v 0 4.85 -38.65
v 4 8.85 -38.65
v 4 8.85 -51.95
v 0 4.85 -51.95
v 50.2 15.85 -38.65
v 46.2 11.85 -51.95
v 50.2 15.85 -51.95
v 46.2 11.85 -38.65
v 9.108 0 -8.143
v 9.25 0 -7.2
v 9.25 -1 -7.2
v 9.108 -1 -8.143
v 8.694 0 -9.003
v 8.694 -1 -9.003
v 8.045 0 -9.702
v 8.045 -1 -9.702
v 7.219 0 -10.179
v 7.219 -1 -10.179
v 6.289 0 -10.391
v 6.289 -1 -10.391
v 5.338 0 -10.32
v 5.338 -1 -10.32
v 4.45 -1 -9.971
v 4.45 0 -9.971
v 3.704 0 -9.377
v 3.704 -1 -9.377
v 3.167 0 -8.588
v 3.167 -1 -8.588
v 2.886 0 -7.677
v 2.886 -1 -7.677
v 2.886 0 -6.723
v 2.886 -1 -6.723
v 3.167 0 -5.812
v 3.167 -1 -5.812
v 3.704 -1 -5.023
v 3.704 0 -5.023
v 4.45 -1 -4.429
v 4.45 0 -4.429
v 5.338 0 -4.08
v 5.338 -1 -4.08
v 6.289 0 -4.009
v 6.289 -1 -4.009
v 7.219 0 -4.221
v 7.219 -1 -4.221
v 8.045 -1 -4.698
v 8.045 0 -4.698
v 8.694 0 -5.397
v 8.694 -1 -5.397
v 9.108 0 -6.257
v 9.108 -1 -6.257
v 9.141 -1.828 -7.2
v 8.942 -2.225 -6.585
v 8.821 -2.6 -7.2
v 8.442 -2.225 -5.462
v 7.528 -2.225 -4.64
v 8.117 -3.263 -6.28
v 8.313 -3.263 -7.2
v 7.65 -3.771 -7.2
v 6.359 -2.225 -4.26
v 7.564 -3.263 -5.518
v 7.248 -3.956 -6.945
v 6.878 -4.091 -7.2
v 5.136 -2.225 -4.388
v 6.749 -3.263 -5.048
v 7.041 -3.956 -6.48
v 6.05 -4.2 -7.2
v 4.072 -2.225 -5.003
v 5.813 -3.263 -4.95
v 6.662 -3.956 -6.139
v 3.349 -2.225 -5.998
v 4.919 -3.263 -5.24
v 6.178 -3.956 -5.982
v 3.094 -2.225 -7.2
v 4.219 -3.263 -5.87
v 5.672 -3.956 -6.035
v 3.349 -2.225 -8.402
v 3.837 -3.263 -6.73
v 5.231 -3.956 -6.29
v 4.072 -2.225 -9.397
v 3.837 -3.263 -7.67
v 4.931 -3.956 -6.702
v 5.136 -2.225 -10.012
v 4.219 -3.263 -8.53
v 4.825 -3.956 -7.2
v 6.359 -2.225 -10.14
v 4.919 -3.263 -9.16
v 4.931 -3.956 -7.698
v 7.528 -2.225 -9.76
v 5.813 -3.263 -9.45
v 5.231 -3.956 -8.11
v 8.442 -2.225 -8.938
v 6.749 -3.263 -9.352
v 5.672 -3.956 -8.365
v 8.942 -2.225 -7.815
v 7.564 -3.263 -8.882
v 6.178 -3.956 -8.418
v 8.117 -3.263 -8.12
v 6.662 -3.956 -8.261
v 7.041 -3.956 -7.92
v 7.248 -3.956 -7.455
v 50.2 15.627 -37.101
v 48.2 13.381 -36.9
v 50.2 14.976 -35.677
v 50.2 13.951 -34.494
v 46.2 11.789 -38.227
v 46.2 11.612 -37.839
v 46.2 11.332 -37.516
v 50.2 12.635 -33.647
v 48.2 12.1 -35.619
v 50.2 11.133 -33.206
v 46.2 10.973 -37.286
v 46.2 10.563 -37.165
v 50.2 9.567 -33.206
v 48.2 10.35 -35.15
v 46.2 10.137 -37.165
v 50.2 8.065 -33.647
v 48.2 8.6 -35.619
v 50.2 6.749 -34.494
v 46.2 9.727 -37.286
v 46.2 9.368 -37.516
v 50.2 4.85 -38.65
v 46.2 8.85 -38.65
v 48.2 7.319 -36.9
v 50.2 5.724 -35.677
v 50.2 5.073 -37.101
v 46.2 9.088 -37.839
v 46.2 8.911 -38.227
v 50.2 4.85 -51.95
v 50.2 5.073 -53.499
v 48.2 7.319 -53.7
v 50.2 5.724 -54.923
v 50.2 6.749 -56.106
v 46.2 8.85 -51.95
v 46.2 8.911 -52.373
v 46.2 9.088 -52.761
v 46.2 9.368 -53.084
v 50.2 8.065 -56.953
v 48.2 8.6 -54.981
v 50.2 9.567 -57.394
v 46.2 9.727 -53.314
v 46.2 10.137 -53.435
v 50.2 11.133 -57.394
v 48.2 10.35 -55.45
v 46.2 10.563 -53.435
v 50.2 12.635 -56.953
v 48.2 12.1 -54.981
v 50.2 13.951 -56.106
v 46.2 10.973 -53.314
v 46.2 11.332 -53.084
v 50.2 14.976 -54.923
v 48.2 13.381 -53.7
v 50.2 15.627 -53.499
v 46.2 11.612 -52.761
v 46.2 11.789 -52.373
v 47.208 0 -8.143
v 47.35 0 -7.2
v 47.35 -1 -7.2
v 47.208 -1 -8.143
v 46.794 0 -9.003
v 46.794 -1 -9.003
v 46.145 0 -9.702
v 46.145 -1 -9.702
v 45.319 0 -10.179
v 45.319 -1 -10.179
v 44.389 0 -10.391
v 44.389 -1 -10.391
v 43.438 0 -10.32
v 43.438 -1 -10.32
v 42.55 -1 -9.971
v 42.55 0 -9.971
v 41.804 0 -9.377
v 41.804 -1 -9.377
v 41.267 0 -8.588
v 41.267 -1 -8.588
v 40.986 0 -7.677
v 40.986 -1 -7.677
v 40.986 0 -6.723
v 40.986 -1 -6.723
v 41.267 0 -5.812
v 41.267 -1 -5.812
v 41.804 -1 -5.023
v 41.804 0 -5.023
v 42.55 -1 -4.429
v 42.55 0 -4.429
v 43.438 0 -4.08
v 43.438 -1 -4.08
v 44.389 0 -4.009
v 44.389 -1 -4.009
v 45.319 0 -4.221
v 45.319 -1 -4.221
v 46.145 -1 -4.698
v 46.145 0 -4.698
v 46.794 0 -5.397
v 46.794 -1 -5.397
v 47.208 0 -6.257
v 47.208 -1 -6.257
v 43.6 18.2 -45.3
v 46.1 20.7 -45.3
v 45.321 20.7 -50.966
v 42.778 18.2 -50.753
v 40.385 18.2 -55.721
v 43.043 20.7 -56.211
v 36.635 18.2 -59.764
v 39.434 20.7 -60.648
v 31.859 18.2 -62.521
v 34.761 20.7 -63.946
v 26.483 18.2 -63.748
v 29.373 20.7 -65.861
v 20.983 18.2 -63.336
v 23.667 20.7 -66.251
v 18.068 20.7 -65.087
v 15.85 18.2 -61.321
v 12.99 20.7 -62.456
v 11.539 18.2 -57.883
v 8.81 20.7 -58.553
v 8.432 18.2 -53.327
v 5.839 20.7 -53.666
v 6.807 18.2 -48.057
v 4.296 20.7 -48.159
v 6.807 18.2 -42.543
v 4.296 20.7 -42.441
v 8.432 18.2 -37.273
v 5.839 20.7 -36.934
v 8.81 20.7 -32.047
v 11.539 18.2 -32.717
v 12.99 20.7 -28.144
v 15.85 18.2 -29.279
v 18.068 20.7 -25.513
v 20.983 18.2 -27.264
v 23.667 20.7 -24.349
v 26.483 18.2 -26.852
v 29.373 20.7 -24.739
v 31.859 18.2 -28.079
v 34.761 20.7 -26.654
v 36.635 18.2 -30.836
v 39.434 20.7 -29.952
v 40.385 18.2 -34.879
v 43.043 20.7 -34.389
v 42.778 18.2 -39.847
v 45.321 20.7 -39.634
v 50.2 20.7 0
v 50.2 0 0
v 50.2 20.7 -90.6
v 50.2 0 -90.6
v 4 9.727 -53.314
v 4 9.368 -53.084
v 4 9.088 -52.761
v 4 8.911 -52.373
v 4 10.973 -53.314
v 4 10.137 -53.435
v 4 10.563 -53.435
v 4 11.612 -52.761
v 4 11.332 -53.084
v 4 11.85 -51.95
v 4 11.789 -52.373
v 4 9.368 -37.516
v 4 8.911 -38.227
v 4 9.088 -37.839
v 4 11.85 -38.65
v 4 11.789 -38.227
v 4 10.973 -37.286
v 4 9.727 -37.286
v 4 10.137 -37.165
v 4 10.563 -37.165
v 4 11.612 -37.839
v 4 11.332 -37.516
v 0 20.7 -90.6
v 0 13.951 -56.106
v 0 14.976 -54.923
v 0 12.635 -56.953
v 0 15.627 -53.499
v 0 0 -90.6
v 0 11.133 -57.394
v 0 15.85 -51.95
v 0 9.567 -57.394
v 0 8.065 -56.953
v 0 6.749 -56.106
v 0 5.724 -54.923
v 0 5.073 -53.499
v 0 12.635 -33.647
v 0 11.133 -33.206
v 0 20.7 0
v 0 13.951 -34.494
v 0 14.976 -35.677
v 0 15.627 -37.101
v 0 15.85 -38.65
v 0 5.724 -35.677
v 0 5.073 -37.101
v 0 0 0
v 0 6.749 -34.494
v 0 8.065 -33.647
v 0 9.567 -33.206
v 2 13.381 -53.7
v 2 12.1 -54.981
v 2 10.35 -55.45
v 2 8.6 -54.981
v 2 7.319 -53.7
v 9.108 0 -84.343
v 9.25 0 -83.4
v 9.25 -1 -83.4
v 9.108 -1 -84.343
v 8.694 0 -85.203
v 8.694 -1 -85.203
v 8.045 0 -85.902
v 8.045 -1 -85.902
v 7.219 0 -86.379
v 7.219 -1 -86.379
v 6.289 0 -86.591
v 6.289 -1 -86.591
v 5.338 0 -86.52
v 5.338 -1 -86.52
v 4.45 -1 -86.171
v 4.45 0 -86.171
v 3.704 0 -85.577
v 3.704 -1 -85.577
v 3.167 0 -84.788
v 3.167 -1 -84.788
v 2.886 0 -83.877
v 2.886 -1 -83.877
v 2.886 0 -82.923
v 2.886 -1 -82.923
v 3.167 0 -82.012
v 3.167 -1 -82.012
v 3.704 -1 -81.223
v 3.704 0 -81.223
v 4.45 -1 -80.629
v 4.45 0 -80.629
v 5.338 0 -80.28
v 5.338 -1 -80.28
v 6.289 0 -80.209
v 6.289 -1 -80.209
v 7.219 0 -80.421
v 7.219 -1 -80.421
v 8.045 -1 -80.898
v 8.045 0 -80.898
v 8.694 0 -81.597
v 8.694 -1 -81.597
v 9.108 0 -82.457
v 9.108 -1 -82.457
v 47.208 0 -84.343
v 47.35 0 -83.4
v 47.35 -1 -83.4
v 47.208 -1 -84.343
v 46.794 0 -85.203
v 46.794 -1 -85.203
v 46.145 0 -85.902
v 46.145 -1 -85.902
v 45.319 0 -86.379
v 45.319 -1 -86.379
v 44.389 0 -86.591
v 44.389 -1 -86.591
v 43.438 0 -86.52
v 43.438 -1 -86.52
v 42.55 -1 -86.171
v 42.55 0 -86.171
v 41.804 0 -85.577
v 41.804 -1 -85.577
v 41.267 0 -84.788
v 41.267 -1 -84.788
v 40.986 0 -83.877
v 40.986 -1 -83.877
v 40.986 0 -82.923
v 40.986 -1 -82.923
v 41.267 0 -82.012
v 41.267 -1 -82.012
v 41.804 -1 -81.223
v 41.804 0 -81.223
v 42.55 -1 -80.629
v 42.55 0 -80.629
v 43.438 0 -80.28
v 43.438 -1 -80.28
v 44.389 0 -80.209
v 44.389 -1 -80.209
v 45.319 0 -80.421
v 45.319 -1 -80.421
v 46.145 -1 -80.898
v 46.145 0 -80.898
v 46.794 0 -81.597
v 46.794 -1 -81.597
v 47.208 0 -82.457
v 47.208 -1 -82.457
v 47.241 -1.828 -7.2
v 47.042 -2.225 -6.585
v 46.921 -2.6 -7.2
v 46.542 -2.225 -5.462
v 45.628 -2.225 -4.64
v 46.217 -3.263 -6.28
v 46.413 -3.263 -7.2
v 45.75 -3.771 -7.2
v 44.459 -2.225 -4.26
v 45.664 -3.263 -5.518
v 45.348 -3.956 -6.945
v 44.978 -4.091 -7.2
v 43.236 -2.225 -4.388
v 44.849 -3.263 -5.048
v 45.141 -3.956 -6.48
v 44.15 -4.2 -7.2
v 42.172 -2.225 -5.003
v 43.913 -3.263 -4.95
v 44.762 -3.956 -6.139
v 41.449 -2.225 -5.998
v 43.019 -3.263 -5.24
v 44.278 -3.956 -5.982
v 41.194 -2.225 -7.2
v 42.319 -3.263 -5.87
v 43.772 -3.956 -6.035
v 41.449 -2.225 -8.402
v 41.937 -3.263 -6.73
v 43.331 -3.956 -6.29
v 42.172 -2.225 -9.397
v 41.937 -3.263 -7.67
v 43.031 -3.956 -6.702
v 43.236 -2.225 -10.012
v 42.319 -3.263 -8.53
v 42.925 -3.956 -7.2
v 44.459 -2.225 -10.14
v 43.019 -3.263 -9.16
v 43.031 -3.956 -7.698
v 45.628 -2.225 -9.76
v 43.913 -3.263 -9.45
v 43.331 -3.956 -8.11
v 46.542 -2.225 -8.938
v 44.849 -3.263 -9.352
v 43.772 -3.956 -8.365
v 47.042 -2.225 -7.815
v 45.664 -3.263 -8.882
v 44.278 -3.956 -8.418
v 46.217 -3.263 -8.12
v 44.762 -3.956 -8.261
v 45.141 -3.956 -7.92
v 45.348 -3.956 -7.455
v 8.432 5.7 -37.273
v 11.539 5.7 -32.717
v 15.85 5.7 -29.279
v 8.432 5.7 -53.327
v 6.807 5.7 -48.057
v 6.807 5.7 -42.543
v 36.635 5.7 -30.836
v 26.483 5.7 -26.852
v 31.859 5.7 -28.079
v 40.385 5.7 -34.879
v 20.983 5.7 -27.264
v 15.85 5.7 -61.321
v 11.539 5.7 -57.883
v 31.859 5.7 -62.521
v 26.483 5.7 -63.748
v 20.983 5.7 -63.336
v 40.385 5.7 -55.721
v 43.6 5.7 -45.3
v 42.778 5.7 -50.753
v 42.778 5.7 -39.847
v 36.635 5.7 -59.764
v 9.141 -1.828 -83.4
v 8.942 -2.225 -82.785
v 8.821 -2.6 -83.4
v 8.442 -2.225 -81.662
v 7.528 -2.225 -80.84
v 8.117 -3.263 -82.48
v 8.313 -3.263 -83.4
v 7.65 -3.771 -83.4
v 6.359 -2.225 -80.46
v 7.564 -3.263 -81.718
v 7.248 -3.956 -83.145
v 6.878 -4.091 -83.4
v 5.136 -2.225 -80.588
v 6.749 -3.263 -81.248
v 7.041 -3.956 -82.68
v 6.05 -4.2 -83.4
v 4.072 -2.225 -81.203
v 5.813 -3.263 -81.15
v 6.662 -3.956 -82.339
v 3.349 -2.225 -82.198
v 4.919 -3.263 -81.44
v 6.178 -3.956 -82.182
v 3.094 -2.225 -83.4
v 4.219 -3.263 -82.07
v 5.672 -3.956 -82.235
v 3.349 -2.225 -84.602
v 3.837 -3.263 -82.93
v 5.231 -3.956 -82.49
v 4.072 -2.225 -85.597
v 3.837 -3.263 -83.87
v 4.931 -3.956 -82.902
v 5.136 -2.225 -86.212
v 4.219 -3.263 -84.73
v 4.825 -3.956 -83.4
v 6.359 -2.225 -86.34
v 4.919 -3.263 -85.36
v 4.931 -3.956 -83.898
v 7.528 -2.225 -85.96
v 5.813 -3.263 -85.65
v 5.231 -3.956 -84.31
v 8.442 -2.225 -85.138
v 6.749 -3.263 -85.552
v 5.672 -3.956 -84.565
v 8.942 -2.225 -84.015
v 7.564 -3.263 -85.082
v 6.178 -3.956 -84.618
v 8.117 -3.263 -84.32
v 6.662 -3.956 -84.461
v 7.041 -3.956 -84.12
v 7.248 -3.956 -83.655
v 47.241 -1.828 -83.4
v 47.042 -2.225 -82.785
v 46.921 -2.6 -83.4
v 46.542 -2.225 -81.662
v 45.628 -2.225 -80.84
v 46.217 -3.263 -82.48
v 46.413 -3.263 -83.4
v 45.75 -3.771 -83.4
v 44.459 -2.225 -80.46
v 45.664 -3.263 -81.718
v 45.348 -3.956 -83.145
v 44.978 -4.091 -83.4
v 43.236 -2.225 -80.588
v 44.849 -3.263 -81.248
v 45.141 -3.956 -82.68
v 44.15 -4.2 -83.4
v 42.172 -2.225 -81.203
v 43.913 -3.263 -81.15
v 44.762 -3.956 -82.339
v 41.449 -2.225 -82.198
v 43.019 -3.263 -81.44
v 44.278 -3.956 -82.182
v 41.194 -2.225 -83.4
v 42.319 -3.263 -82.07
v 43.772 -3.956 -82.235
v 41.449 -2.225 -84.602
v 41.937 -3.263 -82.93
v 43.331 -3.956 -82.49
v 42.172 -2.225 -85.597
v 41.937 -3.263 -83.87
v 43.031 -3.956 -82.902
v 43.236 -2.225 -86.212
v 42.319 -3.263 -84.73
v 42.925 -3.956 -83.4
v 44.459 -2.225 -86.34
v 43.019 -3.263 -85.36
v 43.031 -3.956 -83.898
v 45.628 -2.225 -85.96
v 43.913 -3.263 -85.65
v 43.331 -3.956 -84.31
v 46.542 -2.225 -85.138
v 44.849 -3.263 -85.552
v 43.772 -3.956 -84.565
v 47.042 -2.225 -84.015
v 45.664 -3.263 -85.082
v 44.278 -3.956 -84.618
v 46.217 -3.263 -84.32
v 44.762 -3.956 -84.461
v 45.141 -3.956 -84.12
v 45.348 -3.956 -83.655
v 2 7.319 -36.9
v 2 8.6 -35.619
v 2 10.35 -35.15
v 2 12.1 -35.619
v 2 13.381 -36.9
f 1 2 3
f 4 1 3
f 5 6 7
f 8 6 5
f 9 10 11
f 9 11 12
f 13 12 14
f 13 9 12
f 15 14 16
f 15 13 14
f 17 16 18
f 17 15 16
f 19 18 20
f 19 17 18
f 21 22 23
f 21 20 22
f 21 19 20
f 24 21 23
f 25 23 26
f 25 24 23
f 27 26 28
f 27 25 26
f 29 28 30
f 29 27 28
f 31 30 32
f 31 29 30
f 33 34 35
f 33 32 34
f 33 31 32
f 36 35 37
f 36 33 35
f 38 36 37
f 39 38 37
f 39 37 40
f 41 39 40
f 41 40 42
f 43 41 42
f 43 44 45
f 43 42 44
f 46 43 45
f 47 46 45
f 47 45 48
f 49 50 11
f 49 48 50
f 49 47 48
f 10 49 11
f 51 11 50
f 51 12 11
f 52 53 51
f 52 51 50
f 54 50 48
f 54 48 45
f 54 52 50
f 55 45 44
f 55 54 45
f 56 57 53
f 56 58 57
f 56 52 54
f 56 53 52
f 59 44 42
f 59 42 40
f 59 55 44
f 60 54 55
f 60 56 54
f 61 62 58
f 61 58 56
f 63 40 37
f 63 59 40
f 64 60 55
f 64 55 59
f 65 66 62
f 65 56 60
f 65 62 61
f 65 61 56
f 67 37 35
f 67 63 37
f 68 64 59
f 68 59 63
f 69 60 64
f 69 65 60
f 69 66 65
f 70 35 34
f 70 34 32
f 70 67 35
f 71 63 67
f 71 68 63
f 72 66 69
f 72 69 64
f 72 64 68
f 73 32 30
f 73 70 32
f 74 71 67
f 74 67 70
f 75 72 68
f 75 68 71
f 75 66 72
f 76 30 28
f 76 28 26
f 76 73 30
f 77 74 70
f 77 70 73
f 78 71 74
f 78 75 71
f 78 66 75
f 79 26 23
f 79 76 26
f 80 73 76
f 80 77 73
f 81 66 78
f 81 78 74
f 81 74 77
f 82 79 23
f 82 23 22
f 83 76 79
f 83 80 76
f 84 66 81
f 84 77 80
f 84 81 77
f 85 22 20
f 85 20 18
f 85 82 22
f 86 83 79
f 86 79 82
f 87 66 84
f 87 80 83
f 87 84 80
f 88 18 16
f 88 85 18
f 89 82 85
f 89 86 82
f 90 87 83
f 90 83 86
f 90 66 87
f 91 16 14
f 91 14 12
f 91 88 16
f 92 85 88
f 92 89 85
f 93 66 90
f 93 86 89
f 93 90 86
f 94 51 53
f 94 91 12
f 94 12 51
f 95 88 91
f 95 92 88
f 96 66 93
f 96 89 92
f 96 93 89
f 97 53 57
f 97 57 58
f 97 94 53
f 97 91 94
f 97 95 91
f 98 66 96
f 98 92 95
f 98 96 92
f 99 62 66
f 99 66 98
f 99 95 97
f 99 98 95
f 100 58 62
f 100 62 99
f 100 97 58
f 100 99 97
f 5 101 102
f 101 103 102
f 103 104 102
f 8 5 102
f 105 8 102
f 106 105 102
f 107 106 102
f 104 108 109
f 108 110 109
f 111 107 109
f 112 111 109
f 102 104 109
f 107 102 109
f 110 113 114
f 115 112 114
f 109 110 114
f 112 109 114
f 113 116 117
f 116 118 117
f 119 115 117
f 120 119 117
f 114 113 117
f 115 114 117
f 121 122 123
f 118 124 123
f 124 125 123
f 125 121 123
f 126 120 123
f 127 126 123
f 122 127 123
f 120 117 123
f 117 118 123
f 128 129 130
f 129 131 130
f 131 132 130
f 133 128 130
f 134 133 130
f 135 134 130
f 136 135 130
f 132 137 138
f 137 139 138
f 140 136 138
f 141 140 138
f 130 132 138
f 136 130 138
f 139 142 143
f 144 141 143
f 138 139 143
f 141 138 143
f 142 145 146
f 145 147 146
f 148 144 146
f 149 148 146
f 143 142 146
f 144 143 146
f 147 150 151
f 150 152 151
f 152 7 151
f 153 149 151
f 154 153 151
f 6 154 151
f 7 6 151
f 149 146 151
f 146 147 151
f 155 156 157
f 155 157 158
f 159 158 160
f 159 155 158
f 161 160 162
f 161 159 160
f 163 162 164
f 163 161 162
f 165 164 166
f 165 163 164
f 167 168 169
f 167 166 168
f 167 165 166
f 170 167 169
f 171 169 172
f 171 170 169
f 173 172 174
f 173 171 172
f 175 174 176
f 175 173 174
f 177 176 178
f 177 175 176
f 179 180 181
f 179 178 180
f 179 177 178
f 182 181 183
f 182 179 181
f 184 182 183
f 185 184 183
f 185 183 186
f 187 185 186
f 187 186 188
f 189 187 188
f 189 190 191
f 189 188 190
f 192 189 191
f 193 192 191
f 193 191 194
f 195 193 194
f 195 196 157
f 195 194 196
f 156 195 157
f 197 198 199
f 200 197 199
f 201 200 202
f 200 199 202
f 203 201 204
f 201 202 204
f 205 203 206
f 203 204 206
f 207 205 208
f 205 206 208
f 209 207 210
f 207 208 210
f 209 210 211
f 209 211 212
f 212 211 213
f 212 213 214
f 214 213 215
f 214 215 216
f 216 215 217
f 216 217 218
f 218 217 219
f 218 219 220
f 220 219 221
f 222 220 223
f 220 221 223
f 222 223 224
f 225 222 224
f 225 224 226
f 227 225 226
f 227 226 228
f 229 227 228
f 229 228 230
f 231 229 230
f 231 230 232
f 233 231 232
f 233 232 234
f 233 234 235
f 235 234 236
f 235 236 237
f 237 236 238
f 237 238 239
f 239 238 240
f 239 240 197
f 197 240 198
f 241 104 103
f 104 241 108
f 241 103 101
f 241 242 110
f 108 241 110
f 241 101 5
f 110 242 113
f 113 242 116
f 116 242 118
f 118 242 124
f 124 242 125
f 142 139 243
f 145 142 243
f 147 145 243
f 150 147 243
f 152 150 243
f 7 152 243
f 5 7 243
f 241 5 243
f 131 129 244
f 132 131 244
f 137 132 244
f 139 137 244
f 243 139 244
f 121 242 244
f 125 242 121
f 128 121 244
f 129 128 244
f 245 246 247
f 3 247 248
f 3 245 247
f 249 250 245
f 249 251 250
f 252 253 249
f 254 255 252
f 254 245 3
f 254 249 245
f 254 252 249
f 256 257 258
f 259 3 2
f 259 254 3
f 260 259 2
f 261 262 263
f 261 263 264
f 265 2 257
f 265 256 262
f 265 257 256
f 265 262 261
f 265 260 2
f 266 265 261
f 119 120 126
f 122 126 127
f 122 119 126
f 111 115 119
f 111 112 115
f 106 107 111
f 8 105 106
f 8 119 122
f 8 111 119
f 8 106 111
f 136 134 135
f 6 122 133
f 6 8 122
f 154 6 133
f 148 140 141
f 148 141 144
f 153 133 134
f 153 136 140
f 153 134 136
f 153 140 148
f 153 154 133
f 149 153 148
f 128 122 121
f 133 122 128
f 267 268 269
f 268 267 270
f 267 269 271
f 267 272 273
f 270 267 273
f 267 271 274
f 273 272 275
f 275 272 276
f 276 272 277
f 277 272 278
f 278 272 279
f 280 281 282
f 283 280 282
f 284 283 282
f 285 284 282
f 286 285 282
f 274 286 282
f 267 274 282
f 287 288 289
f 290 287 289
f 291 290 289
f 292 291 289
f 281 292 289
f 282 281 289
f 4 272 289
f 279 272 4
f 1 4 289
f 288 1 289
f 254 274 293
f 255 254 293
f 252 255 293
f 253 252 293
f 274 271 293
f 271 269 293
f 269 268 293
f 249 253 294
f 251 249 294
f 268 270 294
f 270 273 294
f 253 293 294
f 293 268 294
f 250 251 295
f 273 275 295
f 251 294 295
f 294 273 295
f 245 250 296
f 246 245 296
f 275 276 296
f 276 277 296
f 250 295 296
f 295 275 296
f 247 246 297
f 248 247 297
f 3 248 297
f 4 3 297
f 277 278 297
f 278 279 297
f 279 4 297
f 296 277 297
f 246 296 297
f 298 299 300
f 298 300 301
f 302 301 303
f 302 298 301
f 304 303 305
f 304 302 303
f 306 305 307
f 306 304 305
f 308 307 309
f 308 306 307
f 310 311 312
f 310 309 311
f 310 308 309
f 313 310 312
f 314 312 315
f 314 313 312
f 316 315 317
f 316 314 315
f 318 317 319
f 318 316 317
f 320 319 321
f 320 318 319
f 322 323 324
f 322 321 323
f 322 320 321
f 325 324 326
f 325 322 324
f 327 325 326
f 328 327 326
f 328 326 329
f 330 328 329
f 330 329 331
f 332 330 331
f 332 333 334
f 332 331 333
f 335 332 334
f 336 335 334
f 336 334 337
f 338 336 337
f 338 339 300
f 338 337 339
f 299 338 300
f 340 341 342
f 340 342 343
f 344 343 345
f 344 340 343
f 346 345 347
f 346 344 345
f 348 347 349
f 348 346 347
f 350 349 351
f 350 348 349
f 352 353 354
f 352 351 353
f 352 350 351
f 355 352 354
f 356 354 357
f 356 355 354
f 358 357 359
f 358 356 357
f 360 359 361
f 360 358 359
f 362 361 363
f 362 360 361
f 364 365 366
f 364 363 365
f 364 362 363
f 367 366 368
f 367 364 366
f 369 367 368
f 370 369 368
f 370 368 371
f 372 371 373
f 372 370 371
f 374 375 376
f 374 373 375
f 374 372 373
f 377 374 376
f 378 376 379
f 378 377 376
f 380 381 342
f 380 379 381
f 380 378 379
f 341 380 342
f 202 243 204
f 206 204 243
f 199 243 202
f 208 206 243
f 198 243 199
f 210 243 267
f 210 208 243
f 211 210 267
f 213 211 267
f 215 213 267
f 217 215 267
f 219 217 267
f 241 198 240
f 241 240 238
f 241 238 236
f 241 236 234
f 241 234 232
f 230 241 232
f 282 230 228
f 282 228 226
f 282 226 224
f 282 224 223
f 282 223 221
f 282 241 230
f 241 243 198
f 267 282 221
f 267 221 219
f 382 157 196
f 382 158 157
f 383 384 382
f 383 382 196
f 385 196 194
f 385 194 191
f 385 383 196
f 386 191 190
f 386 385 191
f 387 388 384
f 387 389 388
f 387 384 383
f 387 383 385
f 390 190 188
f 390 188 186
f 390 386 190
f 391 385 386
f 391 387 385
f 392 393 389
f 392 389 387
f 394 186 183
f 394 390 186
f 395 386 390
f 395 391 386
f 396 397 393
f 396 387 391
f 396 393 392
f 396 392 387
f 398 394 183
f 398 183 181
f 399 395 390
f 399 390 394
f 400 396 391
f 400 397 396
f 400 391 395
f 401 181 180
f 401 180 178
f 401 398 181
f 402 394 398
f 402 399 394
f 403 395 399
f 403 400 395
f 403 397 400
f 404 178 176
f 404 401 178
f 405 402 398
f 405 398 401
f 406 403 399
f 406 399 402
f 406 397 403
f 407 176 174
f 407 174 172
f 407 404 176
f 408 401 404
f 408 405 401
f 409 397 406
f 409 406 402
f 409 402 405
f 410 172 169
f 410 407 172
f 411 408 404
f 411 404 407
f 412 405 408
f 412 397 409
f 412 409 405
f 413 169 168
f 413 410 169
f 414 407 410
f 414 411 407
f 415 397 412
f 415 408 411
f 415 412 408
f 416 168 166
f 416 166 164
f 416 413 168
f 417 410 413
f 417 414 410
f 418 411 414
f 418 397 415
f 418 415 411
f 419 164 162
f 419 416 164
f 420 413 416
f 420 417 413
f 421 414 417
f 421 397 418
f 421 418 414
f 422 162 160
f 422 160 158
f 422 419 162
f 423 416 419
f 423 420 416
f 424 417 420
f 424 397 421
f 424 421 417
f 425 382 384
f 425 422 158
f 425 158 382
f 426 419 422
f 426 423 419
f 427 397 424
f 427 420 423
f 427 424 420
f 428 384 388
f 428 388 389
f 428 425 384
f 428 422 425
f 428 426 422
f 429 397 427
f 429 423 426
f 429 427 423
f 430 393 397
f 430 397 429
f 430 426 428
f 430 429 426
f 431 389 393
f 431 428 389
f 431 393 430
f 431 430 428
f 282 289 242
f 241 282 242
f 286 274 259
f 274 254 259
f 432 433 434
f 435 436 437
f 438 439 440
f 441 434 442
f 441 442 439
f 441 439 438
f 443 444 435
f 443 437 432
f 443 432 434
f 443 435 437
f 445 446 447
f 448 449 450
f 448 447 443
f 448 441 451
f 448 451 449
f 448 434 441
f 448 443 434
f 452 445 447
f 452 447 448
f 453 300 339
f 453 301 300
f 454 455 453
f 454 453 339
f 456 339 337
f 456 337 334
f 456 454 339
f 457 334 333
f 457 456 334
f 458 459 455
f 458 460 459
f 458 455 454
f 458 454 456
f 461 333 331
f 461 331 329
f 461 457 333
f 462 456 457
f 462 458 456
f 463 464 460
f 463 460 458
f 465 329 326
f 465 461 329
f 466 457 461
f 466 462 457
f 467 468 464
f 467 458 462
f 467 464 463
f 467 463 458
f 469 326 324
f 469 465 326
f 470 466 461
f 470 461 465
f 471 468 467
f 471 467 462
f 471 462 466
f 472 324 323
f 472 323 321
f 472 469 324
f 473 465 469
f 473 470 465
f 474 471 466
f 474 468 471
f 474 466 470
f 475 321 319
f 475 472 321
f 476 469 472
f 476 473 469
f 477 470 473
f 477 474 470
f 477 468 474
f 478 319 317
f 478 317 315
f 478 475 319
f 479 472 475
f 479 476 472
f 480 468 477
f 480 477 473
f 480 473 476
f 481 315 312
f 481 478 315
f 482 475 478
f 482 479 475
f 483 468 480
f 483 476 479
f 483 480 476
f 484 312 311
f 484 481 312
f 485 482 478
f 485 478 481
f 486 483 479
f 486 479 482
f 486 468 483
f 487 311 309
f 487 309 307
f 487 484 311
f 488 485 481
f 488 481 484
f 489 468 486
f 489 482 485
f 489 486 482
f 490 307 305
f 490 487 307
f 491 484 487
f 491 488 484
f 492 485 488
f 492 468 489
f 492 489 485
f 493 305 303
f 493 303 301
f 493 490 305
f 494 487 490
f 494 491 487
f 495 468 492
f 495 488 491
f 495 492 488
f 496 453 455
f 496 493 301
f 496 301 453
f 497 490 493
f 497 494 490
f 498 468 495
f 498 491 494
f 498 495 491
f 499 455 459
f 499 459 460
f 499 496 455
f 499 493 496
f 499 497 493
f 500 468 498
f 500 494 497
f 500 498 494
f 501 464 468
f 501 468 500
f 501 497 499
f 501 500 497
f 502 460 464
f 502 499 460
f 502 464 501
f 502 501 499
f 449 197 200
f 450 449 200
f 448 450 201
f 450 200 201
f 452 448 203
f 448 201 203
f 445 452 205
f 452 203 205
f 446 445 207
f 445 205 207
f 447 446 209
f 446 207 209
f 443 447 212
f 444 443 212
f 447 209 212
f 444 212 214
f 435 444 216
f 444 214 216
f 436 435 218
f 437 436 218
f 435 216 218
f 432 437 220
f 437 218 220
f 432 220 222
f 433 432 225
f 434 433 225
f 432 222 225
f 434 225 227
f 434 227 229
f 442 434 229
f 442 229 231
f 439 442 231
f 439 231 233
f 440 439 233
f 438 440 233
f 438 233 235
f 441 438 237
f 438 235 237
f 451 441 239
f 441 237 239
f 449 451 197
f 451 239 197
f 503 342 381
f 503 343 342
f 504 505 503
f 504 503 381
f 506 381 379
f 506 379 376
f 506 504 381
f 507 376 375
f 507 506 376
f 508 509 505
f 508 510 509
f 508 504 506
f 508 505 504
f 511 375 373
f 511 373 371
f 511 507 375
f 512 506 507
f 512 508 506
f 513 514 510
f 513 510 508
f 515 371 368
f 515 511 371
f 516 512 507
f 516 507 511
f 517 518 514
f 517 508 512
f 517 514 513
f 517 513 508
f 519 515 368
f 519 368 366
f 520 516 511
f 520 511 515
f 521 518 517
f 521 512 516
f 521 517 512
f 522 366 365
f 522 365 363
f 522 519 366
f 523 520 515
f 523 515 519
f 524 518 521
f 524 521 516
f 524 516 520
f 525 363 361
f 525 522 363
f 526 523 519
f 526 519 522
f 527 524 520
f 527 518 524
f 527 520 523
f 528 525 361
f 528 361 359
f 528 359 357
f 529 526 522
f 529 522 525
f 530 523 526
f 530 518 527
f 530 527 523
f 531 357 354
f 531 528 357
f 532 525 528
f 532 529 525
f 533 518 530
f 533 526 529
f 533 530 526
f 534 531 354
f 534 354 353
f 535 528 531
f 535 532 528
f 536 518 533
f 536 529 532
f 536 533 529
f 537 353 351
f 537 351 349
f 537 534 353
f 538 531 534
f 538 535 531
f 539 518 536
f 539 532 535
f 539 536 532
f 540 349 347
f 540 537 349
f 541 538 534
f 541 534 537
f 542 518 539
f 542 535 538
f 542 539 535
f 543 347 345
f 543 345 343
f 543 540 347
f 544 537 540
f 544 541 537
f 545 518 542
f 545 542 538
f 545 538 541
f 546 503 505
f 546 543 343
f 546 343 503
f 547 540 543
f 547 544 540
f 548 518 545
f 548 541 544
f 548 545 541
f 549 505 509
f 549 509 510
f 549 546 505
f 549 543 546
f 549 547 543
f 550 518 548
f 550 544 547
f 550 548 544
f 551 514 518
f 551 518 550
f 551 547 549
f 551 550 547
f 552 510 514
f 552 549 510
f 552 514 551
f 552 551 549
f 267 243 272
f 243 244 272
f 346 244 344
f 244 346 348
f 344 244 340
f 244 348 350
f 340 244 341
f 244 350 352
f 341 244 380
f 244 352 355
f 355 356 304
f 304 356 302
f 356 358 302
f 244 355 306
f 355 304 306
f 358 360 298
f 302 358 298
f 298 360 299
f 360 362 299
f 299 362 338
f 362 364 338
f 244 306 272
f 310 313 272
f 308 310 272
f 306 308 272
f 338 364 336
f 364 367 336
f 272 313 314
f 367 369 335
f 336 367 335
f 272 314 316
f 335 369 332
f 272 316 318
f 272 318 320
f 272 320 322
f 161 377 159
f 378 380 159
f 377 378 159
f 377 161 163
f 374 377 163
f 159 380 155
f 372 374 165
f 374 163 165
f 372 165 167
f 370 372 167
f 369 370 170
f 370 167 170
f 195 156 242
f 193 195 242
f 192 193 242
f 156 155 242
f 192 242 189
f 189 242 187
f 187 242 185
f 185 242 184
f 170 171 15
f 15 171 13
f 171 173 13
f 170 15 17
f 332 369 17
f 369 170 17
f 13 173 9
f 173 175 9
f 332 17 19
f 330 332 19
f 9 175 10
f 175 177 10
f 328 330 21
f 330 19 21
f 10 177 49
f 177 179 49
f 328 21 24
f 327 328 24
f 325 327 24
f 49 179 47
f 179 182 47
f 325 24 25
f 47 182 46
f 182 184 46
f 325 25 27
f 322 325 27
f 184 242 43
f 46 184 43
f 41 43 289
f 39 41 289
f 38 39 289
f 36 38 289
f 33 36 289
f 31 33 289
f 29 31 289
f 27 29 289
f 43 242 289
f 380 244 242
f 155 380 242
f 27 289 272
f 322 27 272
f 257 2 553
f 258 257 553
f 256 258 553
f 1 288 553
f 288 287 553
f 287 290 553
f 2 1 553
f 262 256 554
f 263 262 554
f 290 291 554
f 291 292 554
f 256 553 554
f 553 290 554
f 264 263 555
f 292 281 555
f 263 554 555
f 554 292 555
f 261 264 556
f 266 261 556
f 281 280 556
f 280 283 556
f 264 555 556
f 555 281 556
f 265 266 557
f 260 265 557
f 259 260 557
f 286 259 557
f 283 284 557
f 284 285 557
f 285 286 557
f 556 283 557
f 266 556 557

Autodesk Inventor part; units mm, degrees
ref_plane "YZ Plane" through (0, 0, 0) normal (1, 0, 0) x (0, 1, 0)
ref_plane "XZ Plane" through (0, 0, 0) normal (0, 1, 0) x (-1, 0, 0)
sketch "Boceto1" plane through (0, 0, 0) normal (0, 1, 0) x (-1, 0, 0)
  line L0 (0, 0) -> (-50.2, 0)
  line L1 (-50.2, 0) -> (-50.2, -90.6)
  line L2 (-50.2, -90.6) -> (0, -90.6)
  line L3 (0, -90.6) -> (0, 0)
  dimension "d0" = 50.2
  dimension "d1" = 90.6
extrude "Extrusión1" add sketch "Boceto1" along normal blind 20.7
sketch "Boceto2" plane through (0, 20.7, 0) normal (0, 1, 0) x (1, 0, 0)
  line L0 (-14.4985, 45.3) -> (58.2485, 45.3)
  circle A0 centre (25.1, 45.3) radius 18.5
  line L1 (50.2, 90.6) -> (0, 90.6) projected
  point P0 (0, 0)
  dimension "d7" = 37
  dimension "d51" = 90.6
  dimension "d52" = 0
extrude "Extrusión2" cut sketch "Boceto2" against normal blind 15
sketch "Boceto3" plane through (50.2, 0, 0) normal (1, 0, 0) x (0, 0, -1)
  line L0 (45.3, 28.8672) -> (45.3, -9.3744)
  line L1 (-5.2256, 10.35) -> (70.0589, 10.35)
  line L2 (38.65, 10.35) -> (51.95, 10.35) construction
  line L3 (38.65, 8.85) -> (51.95, 8.85)
  line L4 (51.95, 11.85) -> (38.65, 11.85)
  arc A0 (38.65, 11.85) -> (38.65, 8.85) centre (38.65, 10.35) ccw
  arc A1 (51.95, 8.85) -> (51.95, 11.85) centre (51.95, 10.35) ccw
  line L5 (90.6, 0) -> (90.6, 20.7) projected
  point P0 (0, 0)
  point P1 (45.3, 10.35)
  point P2 (53.45, 10.35)
  point P3 (37.15, 10.35)
  dimension "d11" = 16.3
  dimension "d12" = 3
  dimension "d13" = 0
  dimension "d53" = 45.3
extrude "Extrusión3" cut sketch "Boceto3" against normal blind 4
chamfer "Chaflán1" distance 4 angle 45 4 edges at (50.2, 8.85, -45.3) (50.2, 10.35, -37.15) (50.2, 11.85, -45.3) (50.2, 10.35, -53.45)
sketch "Boceto4" plane through (50.2, 0, 0) normal (1, 0, 0) x (0, 0, -1)
  point P0 (0, 0)
ref_plane "Plano de trabajo1" through (25.1, 0, 0) normal (1, 0, 0) x (0, 0, -1)
mirror "Simetría1" about plane through (25.1, 0, 0) normal (1, 0, 0) of "Extrusión3"
chamfer "Chaflán2" distance 4 angle 45 4 edges at (0, 11.85, -45.3) (0, 10.35, -37.15) (0, 8.85, -45.3) (0, 10.35, -53.45)
chamfer "Chaflán3" distance 2.5 angle 45 1 edges at (6.6, 20.7, -45.3)
sketch "Boceto5" plane through (0, 0, 0) normal (0, -1, 0) x (1, 0, 0)
  line L0 (25.1, 22.2035) -> (25.1, -86.3829)
  line L1 (-10.0483, -45.3) -> (59.9656, -45.3)
  circle A0 centre (6.05, -7.2) radius 3.2
  circle A1 centre (44.15, -7.2) radius 3.2
  circle A2 centre (44.15, -83.4) radius 3.2
  line L2 (0, 0) -> (50.2, 0) projected
  circle A3 centre (6.05, -83.4) radius 3.2
  dimension "d35" = 38.1
  dimension "d36" = 38.1
  dimension "d42" = 6.4
  dimension "d46" = 76.2
  dimension "d47" = 76.2
  dimension "d54" = 45.3
extrude "Extrusión4" add sketch "Boceto5" along normal blind 4.2
fillet "Empalme1" radius 3.2 4 edges at (40.95, -4.2, -7.2) (2.85, -4.2, -7.2) (40.95, -4.2, -83.4) (2.85, -4.2, -83.4)
properties material "Plastico PETG"
